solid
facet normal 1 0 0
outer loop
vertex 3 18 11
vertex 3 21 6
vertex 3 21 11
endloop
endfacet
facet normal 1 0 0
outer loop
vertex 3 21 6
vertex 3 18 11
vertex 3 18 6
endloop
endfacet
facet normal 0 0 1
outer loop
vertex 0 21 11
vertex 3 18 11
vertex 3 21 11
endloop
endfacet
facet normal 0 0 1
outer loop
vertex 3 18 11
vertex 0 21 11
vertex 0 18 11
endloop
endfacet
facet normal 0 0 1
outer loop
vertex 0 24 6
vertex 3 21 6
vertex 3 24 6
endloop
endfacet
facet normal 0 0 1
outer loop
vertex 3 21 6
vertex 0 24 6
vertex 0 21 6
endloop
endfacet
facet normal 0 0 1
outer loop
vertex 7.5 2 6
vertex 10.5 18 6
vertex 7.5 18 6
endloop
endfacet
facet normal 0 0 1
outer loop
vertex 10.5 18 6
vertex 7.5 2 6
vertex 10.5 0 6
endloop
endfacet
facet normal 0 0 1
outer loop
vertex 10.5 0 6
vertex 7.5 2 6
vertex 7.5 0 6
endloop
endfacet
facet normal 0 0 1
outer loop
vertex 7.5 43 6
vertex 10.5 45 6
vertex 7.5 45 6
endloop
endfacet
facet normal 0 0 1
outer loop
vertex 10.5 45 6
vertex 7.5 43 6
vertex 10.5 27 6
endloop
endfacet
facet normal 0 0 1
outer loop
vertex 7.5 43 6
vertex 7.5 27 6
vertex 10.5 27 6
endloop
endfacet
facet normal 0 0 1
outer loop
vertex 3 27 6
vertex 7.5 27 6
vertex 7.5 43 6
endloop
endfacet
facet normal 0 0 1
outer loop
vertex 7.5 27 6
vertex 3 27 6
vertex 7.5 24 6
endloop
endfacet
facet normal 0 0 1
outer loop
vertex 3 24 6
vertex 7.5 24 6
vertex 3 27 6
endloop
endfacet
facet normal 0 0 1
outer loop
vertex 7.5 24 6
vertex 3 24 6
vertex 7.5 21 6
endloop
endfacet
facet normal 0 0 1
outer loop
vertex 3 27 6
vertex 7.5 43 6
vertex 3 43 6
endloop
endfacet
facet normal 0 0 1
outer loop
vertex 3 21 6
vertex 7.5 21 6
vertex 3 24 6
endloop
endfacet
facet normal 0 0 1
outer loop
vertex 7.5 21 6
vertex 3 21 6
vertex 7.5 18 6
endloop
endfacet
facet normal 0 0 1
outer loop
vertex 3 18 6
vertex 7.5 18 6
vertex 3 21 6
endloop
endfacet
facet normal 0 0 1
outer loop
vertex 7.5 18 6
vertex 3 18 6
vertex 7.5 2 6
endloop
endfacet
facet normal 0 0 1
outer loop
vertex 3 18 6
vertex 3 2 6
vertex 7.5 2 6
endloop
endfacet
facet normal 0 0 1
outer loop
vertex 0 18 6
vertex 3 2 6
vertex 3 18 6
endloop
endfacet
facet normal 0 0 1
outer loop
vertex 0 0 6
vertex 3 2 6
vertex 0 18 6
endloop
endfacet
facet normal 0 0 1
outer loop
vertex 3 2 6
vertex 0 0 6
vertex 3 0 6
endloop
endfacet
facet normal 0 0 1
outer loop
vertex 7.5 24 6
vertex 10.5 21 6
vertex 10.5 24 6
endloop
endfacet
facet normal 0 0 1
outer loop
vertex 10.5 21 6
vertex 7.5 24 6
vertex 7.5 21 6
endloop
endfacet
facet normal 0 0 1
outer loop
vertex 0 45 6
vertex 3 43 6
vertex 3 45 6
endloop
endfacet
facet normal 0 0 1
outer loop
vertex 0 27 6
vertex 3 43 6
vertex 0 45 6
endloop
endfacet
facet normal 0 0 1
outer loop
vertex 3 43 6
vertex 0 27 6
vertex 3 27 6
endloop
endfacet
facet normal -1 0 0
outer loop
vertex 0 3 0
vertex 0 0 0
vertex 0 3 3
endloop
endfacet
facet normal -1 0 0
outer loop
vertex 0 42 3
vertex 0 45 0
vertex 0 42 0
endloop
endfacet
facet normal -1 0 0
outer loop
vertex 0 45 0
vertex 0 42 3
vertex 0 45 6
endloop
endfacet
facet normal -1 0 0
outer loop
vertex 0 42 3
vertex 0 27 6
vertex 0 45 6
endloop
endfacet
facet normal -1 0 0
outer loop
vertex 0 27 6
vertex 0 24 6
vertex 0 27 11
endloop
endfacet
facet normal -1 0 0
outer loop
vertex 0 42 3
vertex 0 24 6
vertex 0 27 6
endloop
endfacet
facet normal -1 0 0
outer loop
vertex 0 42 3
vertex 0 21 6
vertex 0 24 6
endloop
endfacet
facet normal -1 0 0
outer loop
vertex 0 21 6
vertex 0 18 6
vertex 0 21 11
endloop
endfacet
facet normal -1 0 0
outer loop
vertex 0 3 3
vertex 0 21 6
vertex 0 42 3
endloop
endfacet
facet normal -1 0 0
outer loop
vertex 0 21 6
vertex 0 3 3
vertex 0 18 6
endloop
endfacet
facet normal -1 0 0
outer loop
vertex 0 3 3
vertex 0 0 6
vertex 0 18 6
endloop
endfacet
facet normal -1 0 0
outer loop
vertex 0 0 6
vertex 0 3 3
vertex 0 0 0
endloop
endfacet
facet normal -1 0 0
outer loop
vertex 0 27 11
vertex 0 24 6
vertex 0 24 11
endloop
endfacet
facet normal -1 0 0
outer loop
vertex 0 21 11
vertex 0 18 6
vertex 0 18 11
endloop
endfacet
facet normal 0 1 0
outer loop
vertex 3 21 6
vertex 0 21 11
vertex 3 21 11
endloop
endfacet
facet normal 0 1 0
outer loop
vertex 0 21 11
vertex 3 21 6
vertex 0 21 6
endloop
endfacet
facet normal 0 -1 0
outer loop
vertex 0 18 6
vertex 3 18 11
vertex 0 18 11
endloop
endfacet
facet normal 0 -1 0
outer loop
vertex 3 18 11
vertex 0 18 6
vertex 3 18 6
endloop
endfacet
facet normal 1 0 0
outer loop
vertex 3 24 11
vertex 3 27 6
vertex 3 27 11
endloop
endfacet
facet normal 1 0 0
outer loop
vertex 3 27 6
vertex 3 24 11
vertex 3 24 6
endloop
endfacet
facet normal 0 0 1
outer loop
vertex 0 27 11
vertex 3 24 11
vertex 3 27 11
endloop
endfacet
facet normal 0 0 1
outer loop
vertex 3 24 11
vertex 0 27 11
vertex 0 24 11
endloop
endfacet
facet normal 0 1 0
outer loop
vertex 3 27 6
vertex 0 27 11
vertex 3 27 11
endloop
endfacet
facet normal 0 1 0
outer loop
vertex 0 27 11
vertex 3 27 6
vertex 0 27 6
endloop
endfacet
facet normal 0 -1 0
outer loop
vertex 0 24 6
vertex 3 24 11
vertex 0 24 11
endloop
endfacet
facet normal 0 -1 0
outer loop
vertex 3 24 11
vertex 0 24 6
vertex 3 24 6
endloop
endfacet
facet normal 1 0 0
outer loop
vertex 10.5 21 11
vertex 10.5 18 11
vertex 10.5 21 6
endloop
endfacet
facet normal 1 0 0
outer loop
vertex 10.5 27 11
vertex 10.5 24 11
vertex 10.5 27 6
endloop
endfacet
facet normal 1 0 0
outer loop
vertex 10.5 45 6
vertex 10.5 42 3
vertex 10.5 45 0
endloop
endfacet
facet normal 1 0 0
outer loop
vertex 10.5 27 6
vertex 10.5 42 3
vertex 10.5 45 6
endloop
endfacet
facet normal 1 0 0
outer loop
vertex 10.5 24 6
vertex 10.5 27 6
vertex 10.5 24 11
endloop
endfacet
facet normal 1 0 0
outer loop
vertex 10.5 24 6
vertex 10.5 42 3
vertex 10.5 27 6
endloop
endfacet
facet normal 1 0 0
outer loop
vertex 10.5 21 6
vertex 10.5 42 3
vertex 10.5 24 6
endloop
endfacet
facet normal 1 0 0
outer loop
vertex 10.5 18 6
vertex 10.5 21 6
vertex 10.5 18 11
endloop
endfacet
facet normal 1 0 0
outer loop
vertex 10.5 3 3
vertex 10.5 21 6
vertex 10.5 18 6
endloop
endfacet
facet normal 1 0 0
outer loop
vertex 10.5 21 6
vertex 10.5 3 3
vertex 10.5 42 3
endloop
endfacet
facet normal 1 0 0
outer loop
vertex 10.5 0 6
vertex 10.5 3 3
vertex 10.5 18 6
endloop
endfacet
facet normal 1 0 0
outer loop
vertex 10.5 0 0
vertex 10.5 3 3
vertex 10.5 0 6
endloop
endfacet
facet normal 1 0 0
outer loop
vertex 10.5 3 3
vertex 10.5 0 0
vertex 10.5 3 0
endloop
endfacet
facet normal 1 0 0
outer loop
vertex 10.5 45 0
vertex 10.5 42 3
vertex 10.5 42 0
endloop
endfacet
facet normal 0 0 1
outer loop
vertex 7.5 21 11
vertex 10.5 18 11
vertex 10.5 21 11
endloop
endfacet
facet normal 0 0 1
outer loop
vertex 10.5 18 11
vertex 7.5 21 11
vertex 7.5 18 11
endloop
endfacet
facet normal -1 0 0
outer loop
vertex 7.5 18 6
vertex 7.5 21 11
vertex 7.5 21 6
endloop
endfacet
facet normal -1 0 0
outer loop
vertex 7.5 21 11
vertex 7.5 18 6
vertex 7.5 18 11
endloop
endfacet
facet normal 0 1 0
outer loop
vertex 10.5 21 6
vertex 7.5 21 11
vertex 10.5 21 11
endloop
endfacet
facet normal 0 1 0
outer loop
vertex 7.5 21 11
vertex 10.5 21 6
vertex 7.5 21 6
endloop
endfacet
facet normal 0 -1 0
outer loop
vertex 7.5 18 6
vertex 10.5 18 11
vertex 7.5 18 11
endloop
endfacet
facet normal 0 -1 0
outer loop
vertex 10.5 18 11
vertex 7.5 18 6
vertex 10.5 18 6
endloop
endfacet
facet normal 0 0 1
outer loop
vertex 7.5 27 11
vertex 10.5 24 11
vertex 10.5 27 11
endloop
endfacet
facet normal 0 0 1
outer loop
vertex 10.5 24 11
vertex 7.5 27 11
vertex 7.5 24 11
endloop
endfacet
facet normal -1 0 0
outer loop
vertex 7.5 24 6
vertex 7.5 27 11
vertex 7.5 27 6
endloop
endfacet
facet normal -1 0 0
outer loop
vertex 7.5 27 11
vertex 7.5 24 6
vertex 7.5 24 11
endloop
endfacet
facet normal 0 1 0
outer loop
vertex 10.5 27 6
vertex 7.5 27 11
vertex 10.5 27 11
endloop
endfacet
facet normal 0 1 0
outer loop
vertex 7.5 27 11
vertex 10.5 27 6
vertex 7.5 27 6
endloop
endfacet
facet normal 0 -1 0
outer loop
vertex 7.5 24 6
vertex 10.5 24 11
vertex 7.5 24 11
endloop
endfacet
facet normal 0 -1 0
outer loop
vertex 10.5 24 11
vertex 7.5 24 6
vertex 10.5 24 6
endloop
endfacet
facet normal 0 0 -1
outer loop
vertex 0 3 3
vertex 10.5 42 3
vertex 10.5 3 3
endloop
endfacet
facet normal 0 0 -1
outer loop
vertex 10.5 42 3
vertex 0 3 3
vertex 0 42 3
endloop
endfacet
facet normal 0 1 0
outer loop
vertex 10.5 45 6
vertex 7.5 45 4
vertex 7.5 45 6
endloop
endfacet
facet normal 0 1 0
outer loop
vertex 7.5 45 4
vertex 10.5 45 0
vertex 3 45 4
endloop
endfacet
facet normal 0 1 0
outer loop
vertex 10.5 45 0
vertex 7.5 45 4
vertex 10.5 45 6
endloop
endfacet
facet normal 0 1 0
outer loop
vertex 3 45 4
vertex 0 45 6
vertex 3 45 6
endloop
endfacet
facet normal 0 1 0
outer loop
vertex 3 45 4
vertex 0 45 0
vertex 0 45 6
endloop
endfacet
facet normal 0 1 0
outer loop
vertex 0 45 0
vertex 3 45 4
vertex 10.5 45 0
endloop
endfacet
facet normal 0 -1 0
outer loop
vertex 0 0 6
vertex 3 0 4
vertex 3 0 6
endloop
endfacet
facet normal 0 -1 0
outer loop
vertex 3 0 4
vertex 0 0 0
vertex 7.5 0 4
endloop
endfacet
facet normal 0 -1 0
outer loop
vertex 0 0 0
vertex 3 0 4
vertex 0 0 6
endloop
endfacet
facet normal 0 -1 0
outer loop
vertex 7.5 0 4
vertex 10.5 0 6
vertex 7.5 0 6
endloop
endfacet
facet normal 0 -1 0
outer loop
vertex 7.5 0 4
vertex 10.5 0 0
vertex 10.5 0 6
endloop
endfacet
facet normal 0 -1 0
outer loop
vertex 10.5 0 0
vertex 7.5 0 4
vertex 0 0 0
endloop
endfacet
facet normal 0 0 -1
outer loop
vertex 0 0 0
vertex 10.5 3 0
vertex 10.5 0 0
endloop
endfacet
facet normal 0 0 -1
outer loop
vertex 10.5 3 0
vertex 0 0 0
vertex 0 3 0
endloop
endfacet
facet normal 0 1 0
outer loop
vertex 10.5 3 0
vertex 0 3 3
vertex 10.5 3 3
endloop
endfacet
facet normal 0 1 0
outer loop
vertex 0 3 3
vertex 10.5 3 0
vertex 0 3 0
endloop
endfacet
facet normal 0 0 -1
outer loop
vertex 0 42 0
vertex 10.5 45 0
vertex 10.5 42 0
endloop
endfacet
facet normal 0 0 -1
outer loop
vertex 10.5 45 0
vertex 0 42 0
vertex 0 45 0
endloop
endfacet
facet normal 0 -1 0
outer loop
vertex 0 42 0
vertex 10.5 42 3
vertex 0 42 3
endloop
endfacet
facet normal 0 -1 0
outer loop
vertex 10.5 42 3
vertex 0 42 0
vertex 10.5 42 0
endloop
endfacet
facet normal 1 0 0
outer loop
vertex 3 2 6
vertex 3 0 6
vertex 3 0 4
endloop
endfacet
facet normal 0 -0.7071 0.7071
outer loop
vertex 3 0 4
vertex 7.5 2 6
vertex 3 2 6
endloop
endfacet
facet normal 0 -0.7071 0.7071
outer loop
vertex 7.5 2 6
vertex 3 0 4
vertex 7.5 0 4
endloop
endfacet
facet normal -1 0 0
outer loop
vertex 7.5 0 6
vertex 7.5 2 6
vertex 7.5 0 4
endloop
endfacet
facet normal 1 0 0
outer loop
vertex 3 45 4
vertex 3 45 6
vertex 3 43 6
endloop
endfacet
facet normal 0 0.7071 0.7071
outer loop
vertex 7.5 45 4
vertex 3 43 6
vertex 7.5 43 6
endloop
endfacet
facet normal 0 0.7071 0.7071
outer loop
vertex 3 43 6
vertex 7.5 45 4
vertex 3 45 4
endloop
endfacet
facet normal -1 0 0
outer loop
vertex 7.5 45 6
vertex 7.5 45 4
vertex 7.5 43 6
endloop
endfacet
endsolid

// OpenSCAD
// --- CONFIG
num_teeth = 2;
pillar_width = 39;
// --- END

width = pillar_width + 3*2;
length = 3 + (3+4.5) * (num_teeth-1);

difference() {
  union() {
    translate([0, 0, 3]) cube([length, width, 3]);
    translate([0, 0, 0]) cube([length, 3, 3]);
    translate([0, pillar_width+3, 0]) cube([length, 3, 3]);

    for (i = [1:num_teeth]) translate([7.5*(i-1), 0, 6]) teeth();
  }
  translate([3, 0, 0]) rut();
  translate([length-6, 0, 0]) rut();
  translate([3, width, 0]) rut();
  translate([length-6, width, 0]) rut();
}


module teeth() {
  translate([0, (width-9)/2, 0]) cube([3, 3, 5]);
  translate([0, (width-9)/2+6, 0]) cube([3, 3, 5]);
}

module rut() {
  translate([0, 0, 4]) rotate([45, 0, 0]) cube(3);
}
